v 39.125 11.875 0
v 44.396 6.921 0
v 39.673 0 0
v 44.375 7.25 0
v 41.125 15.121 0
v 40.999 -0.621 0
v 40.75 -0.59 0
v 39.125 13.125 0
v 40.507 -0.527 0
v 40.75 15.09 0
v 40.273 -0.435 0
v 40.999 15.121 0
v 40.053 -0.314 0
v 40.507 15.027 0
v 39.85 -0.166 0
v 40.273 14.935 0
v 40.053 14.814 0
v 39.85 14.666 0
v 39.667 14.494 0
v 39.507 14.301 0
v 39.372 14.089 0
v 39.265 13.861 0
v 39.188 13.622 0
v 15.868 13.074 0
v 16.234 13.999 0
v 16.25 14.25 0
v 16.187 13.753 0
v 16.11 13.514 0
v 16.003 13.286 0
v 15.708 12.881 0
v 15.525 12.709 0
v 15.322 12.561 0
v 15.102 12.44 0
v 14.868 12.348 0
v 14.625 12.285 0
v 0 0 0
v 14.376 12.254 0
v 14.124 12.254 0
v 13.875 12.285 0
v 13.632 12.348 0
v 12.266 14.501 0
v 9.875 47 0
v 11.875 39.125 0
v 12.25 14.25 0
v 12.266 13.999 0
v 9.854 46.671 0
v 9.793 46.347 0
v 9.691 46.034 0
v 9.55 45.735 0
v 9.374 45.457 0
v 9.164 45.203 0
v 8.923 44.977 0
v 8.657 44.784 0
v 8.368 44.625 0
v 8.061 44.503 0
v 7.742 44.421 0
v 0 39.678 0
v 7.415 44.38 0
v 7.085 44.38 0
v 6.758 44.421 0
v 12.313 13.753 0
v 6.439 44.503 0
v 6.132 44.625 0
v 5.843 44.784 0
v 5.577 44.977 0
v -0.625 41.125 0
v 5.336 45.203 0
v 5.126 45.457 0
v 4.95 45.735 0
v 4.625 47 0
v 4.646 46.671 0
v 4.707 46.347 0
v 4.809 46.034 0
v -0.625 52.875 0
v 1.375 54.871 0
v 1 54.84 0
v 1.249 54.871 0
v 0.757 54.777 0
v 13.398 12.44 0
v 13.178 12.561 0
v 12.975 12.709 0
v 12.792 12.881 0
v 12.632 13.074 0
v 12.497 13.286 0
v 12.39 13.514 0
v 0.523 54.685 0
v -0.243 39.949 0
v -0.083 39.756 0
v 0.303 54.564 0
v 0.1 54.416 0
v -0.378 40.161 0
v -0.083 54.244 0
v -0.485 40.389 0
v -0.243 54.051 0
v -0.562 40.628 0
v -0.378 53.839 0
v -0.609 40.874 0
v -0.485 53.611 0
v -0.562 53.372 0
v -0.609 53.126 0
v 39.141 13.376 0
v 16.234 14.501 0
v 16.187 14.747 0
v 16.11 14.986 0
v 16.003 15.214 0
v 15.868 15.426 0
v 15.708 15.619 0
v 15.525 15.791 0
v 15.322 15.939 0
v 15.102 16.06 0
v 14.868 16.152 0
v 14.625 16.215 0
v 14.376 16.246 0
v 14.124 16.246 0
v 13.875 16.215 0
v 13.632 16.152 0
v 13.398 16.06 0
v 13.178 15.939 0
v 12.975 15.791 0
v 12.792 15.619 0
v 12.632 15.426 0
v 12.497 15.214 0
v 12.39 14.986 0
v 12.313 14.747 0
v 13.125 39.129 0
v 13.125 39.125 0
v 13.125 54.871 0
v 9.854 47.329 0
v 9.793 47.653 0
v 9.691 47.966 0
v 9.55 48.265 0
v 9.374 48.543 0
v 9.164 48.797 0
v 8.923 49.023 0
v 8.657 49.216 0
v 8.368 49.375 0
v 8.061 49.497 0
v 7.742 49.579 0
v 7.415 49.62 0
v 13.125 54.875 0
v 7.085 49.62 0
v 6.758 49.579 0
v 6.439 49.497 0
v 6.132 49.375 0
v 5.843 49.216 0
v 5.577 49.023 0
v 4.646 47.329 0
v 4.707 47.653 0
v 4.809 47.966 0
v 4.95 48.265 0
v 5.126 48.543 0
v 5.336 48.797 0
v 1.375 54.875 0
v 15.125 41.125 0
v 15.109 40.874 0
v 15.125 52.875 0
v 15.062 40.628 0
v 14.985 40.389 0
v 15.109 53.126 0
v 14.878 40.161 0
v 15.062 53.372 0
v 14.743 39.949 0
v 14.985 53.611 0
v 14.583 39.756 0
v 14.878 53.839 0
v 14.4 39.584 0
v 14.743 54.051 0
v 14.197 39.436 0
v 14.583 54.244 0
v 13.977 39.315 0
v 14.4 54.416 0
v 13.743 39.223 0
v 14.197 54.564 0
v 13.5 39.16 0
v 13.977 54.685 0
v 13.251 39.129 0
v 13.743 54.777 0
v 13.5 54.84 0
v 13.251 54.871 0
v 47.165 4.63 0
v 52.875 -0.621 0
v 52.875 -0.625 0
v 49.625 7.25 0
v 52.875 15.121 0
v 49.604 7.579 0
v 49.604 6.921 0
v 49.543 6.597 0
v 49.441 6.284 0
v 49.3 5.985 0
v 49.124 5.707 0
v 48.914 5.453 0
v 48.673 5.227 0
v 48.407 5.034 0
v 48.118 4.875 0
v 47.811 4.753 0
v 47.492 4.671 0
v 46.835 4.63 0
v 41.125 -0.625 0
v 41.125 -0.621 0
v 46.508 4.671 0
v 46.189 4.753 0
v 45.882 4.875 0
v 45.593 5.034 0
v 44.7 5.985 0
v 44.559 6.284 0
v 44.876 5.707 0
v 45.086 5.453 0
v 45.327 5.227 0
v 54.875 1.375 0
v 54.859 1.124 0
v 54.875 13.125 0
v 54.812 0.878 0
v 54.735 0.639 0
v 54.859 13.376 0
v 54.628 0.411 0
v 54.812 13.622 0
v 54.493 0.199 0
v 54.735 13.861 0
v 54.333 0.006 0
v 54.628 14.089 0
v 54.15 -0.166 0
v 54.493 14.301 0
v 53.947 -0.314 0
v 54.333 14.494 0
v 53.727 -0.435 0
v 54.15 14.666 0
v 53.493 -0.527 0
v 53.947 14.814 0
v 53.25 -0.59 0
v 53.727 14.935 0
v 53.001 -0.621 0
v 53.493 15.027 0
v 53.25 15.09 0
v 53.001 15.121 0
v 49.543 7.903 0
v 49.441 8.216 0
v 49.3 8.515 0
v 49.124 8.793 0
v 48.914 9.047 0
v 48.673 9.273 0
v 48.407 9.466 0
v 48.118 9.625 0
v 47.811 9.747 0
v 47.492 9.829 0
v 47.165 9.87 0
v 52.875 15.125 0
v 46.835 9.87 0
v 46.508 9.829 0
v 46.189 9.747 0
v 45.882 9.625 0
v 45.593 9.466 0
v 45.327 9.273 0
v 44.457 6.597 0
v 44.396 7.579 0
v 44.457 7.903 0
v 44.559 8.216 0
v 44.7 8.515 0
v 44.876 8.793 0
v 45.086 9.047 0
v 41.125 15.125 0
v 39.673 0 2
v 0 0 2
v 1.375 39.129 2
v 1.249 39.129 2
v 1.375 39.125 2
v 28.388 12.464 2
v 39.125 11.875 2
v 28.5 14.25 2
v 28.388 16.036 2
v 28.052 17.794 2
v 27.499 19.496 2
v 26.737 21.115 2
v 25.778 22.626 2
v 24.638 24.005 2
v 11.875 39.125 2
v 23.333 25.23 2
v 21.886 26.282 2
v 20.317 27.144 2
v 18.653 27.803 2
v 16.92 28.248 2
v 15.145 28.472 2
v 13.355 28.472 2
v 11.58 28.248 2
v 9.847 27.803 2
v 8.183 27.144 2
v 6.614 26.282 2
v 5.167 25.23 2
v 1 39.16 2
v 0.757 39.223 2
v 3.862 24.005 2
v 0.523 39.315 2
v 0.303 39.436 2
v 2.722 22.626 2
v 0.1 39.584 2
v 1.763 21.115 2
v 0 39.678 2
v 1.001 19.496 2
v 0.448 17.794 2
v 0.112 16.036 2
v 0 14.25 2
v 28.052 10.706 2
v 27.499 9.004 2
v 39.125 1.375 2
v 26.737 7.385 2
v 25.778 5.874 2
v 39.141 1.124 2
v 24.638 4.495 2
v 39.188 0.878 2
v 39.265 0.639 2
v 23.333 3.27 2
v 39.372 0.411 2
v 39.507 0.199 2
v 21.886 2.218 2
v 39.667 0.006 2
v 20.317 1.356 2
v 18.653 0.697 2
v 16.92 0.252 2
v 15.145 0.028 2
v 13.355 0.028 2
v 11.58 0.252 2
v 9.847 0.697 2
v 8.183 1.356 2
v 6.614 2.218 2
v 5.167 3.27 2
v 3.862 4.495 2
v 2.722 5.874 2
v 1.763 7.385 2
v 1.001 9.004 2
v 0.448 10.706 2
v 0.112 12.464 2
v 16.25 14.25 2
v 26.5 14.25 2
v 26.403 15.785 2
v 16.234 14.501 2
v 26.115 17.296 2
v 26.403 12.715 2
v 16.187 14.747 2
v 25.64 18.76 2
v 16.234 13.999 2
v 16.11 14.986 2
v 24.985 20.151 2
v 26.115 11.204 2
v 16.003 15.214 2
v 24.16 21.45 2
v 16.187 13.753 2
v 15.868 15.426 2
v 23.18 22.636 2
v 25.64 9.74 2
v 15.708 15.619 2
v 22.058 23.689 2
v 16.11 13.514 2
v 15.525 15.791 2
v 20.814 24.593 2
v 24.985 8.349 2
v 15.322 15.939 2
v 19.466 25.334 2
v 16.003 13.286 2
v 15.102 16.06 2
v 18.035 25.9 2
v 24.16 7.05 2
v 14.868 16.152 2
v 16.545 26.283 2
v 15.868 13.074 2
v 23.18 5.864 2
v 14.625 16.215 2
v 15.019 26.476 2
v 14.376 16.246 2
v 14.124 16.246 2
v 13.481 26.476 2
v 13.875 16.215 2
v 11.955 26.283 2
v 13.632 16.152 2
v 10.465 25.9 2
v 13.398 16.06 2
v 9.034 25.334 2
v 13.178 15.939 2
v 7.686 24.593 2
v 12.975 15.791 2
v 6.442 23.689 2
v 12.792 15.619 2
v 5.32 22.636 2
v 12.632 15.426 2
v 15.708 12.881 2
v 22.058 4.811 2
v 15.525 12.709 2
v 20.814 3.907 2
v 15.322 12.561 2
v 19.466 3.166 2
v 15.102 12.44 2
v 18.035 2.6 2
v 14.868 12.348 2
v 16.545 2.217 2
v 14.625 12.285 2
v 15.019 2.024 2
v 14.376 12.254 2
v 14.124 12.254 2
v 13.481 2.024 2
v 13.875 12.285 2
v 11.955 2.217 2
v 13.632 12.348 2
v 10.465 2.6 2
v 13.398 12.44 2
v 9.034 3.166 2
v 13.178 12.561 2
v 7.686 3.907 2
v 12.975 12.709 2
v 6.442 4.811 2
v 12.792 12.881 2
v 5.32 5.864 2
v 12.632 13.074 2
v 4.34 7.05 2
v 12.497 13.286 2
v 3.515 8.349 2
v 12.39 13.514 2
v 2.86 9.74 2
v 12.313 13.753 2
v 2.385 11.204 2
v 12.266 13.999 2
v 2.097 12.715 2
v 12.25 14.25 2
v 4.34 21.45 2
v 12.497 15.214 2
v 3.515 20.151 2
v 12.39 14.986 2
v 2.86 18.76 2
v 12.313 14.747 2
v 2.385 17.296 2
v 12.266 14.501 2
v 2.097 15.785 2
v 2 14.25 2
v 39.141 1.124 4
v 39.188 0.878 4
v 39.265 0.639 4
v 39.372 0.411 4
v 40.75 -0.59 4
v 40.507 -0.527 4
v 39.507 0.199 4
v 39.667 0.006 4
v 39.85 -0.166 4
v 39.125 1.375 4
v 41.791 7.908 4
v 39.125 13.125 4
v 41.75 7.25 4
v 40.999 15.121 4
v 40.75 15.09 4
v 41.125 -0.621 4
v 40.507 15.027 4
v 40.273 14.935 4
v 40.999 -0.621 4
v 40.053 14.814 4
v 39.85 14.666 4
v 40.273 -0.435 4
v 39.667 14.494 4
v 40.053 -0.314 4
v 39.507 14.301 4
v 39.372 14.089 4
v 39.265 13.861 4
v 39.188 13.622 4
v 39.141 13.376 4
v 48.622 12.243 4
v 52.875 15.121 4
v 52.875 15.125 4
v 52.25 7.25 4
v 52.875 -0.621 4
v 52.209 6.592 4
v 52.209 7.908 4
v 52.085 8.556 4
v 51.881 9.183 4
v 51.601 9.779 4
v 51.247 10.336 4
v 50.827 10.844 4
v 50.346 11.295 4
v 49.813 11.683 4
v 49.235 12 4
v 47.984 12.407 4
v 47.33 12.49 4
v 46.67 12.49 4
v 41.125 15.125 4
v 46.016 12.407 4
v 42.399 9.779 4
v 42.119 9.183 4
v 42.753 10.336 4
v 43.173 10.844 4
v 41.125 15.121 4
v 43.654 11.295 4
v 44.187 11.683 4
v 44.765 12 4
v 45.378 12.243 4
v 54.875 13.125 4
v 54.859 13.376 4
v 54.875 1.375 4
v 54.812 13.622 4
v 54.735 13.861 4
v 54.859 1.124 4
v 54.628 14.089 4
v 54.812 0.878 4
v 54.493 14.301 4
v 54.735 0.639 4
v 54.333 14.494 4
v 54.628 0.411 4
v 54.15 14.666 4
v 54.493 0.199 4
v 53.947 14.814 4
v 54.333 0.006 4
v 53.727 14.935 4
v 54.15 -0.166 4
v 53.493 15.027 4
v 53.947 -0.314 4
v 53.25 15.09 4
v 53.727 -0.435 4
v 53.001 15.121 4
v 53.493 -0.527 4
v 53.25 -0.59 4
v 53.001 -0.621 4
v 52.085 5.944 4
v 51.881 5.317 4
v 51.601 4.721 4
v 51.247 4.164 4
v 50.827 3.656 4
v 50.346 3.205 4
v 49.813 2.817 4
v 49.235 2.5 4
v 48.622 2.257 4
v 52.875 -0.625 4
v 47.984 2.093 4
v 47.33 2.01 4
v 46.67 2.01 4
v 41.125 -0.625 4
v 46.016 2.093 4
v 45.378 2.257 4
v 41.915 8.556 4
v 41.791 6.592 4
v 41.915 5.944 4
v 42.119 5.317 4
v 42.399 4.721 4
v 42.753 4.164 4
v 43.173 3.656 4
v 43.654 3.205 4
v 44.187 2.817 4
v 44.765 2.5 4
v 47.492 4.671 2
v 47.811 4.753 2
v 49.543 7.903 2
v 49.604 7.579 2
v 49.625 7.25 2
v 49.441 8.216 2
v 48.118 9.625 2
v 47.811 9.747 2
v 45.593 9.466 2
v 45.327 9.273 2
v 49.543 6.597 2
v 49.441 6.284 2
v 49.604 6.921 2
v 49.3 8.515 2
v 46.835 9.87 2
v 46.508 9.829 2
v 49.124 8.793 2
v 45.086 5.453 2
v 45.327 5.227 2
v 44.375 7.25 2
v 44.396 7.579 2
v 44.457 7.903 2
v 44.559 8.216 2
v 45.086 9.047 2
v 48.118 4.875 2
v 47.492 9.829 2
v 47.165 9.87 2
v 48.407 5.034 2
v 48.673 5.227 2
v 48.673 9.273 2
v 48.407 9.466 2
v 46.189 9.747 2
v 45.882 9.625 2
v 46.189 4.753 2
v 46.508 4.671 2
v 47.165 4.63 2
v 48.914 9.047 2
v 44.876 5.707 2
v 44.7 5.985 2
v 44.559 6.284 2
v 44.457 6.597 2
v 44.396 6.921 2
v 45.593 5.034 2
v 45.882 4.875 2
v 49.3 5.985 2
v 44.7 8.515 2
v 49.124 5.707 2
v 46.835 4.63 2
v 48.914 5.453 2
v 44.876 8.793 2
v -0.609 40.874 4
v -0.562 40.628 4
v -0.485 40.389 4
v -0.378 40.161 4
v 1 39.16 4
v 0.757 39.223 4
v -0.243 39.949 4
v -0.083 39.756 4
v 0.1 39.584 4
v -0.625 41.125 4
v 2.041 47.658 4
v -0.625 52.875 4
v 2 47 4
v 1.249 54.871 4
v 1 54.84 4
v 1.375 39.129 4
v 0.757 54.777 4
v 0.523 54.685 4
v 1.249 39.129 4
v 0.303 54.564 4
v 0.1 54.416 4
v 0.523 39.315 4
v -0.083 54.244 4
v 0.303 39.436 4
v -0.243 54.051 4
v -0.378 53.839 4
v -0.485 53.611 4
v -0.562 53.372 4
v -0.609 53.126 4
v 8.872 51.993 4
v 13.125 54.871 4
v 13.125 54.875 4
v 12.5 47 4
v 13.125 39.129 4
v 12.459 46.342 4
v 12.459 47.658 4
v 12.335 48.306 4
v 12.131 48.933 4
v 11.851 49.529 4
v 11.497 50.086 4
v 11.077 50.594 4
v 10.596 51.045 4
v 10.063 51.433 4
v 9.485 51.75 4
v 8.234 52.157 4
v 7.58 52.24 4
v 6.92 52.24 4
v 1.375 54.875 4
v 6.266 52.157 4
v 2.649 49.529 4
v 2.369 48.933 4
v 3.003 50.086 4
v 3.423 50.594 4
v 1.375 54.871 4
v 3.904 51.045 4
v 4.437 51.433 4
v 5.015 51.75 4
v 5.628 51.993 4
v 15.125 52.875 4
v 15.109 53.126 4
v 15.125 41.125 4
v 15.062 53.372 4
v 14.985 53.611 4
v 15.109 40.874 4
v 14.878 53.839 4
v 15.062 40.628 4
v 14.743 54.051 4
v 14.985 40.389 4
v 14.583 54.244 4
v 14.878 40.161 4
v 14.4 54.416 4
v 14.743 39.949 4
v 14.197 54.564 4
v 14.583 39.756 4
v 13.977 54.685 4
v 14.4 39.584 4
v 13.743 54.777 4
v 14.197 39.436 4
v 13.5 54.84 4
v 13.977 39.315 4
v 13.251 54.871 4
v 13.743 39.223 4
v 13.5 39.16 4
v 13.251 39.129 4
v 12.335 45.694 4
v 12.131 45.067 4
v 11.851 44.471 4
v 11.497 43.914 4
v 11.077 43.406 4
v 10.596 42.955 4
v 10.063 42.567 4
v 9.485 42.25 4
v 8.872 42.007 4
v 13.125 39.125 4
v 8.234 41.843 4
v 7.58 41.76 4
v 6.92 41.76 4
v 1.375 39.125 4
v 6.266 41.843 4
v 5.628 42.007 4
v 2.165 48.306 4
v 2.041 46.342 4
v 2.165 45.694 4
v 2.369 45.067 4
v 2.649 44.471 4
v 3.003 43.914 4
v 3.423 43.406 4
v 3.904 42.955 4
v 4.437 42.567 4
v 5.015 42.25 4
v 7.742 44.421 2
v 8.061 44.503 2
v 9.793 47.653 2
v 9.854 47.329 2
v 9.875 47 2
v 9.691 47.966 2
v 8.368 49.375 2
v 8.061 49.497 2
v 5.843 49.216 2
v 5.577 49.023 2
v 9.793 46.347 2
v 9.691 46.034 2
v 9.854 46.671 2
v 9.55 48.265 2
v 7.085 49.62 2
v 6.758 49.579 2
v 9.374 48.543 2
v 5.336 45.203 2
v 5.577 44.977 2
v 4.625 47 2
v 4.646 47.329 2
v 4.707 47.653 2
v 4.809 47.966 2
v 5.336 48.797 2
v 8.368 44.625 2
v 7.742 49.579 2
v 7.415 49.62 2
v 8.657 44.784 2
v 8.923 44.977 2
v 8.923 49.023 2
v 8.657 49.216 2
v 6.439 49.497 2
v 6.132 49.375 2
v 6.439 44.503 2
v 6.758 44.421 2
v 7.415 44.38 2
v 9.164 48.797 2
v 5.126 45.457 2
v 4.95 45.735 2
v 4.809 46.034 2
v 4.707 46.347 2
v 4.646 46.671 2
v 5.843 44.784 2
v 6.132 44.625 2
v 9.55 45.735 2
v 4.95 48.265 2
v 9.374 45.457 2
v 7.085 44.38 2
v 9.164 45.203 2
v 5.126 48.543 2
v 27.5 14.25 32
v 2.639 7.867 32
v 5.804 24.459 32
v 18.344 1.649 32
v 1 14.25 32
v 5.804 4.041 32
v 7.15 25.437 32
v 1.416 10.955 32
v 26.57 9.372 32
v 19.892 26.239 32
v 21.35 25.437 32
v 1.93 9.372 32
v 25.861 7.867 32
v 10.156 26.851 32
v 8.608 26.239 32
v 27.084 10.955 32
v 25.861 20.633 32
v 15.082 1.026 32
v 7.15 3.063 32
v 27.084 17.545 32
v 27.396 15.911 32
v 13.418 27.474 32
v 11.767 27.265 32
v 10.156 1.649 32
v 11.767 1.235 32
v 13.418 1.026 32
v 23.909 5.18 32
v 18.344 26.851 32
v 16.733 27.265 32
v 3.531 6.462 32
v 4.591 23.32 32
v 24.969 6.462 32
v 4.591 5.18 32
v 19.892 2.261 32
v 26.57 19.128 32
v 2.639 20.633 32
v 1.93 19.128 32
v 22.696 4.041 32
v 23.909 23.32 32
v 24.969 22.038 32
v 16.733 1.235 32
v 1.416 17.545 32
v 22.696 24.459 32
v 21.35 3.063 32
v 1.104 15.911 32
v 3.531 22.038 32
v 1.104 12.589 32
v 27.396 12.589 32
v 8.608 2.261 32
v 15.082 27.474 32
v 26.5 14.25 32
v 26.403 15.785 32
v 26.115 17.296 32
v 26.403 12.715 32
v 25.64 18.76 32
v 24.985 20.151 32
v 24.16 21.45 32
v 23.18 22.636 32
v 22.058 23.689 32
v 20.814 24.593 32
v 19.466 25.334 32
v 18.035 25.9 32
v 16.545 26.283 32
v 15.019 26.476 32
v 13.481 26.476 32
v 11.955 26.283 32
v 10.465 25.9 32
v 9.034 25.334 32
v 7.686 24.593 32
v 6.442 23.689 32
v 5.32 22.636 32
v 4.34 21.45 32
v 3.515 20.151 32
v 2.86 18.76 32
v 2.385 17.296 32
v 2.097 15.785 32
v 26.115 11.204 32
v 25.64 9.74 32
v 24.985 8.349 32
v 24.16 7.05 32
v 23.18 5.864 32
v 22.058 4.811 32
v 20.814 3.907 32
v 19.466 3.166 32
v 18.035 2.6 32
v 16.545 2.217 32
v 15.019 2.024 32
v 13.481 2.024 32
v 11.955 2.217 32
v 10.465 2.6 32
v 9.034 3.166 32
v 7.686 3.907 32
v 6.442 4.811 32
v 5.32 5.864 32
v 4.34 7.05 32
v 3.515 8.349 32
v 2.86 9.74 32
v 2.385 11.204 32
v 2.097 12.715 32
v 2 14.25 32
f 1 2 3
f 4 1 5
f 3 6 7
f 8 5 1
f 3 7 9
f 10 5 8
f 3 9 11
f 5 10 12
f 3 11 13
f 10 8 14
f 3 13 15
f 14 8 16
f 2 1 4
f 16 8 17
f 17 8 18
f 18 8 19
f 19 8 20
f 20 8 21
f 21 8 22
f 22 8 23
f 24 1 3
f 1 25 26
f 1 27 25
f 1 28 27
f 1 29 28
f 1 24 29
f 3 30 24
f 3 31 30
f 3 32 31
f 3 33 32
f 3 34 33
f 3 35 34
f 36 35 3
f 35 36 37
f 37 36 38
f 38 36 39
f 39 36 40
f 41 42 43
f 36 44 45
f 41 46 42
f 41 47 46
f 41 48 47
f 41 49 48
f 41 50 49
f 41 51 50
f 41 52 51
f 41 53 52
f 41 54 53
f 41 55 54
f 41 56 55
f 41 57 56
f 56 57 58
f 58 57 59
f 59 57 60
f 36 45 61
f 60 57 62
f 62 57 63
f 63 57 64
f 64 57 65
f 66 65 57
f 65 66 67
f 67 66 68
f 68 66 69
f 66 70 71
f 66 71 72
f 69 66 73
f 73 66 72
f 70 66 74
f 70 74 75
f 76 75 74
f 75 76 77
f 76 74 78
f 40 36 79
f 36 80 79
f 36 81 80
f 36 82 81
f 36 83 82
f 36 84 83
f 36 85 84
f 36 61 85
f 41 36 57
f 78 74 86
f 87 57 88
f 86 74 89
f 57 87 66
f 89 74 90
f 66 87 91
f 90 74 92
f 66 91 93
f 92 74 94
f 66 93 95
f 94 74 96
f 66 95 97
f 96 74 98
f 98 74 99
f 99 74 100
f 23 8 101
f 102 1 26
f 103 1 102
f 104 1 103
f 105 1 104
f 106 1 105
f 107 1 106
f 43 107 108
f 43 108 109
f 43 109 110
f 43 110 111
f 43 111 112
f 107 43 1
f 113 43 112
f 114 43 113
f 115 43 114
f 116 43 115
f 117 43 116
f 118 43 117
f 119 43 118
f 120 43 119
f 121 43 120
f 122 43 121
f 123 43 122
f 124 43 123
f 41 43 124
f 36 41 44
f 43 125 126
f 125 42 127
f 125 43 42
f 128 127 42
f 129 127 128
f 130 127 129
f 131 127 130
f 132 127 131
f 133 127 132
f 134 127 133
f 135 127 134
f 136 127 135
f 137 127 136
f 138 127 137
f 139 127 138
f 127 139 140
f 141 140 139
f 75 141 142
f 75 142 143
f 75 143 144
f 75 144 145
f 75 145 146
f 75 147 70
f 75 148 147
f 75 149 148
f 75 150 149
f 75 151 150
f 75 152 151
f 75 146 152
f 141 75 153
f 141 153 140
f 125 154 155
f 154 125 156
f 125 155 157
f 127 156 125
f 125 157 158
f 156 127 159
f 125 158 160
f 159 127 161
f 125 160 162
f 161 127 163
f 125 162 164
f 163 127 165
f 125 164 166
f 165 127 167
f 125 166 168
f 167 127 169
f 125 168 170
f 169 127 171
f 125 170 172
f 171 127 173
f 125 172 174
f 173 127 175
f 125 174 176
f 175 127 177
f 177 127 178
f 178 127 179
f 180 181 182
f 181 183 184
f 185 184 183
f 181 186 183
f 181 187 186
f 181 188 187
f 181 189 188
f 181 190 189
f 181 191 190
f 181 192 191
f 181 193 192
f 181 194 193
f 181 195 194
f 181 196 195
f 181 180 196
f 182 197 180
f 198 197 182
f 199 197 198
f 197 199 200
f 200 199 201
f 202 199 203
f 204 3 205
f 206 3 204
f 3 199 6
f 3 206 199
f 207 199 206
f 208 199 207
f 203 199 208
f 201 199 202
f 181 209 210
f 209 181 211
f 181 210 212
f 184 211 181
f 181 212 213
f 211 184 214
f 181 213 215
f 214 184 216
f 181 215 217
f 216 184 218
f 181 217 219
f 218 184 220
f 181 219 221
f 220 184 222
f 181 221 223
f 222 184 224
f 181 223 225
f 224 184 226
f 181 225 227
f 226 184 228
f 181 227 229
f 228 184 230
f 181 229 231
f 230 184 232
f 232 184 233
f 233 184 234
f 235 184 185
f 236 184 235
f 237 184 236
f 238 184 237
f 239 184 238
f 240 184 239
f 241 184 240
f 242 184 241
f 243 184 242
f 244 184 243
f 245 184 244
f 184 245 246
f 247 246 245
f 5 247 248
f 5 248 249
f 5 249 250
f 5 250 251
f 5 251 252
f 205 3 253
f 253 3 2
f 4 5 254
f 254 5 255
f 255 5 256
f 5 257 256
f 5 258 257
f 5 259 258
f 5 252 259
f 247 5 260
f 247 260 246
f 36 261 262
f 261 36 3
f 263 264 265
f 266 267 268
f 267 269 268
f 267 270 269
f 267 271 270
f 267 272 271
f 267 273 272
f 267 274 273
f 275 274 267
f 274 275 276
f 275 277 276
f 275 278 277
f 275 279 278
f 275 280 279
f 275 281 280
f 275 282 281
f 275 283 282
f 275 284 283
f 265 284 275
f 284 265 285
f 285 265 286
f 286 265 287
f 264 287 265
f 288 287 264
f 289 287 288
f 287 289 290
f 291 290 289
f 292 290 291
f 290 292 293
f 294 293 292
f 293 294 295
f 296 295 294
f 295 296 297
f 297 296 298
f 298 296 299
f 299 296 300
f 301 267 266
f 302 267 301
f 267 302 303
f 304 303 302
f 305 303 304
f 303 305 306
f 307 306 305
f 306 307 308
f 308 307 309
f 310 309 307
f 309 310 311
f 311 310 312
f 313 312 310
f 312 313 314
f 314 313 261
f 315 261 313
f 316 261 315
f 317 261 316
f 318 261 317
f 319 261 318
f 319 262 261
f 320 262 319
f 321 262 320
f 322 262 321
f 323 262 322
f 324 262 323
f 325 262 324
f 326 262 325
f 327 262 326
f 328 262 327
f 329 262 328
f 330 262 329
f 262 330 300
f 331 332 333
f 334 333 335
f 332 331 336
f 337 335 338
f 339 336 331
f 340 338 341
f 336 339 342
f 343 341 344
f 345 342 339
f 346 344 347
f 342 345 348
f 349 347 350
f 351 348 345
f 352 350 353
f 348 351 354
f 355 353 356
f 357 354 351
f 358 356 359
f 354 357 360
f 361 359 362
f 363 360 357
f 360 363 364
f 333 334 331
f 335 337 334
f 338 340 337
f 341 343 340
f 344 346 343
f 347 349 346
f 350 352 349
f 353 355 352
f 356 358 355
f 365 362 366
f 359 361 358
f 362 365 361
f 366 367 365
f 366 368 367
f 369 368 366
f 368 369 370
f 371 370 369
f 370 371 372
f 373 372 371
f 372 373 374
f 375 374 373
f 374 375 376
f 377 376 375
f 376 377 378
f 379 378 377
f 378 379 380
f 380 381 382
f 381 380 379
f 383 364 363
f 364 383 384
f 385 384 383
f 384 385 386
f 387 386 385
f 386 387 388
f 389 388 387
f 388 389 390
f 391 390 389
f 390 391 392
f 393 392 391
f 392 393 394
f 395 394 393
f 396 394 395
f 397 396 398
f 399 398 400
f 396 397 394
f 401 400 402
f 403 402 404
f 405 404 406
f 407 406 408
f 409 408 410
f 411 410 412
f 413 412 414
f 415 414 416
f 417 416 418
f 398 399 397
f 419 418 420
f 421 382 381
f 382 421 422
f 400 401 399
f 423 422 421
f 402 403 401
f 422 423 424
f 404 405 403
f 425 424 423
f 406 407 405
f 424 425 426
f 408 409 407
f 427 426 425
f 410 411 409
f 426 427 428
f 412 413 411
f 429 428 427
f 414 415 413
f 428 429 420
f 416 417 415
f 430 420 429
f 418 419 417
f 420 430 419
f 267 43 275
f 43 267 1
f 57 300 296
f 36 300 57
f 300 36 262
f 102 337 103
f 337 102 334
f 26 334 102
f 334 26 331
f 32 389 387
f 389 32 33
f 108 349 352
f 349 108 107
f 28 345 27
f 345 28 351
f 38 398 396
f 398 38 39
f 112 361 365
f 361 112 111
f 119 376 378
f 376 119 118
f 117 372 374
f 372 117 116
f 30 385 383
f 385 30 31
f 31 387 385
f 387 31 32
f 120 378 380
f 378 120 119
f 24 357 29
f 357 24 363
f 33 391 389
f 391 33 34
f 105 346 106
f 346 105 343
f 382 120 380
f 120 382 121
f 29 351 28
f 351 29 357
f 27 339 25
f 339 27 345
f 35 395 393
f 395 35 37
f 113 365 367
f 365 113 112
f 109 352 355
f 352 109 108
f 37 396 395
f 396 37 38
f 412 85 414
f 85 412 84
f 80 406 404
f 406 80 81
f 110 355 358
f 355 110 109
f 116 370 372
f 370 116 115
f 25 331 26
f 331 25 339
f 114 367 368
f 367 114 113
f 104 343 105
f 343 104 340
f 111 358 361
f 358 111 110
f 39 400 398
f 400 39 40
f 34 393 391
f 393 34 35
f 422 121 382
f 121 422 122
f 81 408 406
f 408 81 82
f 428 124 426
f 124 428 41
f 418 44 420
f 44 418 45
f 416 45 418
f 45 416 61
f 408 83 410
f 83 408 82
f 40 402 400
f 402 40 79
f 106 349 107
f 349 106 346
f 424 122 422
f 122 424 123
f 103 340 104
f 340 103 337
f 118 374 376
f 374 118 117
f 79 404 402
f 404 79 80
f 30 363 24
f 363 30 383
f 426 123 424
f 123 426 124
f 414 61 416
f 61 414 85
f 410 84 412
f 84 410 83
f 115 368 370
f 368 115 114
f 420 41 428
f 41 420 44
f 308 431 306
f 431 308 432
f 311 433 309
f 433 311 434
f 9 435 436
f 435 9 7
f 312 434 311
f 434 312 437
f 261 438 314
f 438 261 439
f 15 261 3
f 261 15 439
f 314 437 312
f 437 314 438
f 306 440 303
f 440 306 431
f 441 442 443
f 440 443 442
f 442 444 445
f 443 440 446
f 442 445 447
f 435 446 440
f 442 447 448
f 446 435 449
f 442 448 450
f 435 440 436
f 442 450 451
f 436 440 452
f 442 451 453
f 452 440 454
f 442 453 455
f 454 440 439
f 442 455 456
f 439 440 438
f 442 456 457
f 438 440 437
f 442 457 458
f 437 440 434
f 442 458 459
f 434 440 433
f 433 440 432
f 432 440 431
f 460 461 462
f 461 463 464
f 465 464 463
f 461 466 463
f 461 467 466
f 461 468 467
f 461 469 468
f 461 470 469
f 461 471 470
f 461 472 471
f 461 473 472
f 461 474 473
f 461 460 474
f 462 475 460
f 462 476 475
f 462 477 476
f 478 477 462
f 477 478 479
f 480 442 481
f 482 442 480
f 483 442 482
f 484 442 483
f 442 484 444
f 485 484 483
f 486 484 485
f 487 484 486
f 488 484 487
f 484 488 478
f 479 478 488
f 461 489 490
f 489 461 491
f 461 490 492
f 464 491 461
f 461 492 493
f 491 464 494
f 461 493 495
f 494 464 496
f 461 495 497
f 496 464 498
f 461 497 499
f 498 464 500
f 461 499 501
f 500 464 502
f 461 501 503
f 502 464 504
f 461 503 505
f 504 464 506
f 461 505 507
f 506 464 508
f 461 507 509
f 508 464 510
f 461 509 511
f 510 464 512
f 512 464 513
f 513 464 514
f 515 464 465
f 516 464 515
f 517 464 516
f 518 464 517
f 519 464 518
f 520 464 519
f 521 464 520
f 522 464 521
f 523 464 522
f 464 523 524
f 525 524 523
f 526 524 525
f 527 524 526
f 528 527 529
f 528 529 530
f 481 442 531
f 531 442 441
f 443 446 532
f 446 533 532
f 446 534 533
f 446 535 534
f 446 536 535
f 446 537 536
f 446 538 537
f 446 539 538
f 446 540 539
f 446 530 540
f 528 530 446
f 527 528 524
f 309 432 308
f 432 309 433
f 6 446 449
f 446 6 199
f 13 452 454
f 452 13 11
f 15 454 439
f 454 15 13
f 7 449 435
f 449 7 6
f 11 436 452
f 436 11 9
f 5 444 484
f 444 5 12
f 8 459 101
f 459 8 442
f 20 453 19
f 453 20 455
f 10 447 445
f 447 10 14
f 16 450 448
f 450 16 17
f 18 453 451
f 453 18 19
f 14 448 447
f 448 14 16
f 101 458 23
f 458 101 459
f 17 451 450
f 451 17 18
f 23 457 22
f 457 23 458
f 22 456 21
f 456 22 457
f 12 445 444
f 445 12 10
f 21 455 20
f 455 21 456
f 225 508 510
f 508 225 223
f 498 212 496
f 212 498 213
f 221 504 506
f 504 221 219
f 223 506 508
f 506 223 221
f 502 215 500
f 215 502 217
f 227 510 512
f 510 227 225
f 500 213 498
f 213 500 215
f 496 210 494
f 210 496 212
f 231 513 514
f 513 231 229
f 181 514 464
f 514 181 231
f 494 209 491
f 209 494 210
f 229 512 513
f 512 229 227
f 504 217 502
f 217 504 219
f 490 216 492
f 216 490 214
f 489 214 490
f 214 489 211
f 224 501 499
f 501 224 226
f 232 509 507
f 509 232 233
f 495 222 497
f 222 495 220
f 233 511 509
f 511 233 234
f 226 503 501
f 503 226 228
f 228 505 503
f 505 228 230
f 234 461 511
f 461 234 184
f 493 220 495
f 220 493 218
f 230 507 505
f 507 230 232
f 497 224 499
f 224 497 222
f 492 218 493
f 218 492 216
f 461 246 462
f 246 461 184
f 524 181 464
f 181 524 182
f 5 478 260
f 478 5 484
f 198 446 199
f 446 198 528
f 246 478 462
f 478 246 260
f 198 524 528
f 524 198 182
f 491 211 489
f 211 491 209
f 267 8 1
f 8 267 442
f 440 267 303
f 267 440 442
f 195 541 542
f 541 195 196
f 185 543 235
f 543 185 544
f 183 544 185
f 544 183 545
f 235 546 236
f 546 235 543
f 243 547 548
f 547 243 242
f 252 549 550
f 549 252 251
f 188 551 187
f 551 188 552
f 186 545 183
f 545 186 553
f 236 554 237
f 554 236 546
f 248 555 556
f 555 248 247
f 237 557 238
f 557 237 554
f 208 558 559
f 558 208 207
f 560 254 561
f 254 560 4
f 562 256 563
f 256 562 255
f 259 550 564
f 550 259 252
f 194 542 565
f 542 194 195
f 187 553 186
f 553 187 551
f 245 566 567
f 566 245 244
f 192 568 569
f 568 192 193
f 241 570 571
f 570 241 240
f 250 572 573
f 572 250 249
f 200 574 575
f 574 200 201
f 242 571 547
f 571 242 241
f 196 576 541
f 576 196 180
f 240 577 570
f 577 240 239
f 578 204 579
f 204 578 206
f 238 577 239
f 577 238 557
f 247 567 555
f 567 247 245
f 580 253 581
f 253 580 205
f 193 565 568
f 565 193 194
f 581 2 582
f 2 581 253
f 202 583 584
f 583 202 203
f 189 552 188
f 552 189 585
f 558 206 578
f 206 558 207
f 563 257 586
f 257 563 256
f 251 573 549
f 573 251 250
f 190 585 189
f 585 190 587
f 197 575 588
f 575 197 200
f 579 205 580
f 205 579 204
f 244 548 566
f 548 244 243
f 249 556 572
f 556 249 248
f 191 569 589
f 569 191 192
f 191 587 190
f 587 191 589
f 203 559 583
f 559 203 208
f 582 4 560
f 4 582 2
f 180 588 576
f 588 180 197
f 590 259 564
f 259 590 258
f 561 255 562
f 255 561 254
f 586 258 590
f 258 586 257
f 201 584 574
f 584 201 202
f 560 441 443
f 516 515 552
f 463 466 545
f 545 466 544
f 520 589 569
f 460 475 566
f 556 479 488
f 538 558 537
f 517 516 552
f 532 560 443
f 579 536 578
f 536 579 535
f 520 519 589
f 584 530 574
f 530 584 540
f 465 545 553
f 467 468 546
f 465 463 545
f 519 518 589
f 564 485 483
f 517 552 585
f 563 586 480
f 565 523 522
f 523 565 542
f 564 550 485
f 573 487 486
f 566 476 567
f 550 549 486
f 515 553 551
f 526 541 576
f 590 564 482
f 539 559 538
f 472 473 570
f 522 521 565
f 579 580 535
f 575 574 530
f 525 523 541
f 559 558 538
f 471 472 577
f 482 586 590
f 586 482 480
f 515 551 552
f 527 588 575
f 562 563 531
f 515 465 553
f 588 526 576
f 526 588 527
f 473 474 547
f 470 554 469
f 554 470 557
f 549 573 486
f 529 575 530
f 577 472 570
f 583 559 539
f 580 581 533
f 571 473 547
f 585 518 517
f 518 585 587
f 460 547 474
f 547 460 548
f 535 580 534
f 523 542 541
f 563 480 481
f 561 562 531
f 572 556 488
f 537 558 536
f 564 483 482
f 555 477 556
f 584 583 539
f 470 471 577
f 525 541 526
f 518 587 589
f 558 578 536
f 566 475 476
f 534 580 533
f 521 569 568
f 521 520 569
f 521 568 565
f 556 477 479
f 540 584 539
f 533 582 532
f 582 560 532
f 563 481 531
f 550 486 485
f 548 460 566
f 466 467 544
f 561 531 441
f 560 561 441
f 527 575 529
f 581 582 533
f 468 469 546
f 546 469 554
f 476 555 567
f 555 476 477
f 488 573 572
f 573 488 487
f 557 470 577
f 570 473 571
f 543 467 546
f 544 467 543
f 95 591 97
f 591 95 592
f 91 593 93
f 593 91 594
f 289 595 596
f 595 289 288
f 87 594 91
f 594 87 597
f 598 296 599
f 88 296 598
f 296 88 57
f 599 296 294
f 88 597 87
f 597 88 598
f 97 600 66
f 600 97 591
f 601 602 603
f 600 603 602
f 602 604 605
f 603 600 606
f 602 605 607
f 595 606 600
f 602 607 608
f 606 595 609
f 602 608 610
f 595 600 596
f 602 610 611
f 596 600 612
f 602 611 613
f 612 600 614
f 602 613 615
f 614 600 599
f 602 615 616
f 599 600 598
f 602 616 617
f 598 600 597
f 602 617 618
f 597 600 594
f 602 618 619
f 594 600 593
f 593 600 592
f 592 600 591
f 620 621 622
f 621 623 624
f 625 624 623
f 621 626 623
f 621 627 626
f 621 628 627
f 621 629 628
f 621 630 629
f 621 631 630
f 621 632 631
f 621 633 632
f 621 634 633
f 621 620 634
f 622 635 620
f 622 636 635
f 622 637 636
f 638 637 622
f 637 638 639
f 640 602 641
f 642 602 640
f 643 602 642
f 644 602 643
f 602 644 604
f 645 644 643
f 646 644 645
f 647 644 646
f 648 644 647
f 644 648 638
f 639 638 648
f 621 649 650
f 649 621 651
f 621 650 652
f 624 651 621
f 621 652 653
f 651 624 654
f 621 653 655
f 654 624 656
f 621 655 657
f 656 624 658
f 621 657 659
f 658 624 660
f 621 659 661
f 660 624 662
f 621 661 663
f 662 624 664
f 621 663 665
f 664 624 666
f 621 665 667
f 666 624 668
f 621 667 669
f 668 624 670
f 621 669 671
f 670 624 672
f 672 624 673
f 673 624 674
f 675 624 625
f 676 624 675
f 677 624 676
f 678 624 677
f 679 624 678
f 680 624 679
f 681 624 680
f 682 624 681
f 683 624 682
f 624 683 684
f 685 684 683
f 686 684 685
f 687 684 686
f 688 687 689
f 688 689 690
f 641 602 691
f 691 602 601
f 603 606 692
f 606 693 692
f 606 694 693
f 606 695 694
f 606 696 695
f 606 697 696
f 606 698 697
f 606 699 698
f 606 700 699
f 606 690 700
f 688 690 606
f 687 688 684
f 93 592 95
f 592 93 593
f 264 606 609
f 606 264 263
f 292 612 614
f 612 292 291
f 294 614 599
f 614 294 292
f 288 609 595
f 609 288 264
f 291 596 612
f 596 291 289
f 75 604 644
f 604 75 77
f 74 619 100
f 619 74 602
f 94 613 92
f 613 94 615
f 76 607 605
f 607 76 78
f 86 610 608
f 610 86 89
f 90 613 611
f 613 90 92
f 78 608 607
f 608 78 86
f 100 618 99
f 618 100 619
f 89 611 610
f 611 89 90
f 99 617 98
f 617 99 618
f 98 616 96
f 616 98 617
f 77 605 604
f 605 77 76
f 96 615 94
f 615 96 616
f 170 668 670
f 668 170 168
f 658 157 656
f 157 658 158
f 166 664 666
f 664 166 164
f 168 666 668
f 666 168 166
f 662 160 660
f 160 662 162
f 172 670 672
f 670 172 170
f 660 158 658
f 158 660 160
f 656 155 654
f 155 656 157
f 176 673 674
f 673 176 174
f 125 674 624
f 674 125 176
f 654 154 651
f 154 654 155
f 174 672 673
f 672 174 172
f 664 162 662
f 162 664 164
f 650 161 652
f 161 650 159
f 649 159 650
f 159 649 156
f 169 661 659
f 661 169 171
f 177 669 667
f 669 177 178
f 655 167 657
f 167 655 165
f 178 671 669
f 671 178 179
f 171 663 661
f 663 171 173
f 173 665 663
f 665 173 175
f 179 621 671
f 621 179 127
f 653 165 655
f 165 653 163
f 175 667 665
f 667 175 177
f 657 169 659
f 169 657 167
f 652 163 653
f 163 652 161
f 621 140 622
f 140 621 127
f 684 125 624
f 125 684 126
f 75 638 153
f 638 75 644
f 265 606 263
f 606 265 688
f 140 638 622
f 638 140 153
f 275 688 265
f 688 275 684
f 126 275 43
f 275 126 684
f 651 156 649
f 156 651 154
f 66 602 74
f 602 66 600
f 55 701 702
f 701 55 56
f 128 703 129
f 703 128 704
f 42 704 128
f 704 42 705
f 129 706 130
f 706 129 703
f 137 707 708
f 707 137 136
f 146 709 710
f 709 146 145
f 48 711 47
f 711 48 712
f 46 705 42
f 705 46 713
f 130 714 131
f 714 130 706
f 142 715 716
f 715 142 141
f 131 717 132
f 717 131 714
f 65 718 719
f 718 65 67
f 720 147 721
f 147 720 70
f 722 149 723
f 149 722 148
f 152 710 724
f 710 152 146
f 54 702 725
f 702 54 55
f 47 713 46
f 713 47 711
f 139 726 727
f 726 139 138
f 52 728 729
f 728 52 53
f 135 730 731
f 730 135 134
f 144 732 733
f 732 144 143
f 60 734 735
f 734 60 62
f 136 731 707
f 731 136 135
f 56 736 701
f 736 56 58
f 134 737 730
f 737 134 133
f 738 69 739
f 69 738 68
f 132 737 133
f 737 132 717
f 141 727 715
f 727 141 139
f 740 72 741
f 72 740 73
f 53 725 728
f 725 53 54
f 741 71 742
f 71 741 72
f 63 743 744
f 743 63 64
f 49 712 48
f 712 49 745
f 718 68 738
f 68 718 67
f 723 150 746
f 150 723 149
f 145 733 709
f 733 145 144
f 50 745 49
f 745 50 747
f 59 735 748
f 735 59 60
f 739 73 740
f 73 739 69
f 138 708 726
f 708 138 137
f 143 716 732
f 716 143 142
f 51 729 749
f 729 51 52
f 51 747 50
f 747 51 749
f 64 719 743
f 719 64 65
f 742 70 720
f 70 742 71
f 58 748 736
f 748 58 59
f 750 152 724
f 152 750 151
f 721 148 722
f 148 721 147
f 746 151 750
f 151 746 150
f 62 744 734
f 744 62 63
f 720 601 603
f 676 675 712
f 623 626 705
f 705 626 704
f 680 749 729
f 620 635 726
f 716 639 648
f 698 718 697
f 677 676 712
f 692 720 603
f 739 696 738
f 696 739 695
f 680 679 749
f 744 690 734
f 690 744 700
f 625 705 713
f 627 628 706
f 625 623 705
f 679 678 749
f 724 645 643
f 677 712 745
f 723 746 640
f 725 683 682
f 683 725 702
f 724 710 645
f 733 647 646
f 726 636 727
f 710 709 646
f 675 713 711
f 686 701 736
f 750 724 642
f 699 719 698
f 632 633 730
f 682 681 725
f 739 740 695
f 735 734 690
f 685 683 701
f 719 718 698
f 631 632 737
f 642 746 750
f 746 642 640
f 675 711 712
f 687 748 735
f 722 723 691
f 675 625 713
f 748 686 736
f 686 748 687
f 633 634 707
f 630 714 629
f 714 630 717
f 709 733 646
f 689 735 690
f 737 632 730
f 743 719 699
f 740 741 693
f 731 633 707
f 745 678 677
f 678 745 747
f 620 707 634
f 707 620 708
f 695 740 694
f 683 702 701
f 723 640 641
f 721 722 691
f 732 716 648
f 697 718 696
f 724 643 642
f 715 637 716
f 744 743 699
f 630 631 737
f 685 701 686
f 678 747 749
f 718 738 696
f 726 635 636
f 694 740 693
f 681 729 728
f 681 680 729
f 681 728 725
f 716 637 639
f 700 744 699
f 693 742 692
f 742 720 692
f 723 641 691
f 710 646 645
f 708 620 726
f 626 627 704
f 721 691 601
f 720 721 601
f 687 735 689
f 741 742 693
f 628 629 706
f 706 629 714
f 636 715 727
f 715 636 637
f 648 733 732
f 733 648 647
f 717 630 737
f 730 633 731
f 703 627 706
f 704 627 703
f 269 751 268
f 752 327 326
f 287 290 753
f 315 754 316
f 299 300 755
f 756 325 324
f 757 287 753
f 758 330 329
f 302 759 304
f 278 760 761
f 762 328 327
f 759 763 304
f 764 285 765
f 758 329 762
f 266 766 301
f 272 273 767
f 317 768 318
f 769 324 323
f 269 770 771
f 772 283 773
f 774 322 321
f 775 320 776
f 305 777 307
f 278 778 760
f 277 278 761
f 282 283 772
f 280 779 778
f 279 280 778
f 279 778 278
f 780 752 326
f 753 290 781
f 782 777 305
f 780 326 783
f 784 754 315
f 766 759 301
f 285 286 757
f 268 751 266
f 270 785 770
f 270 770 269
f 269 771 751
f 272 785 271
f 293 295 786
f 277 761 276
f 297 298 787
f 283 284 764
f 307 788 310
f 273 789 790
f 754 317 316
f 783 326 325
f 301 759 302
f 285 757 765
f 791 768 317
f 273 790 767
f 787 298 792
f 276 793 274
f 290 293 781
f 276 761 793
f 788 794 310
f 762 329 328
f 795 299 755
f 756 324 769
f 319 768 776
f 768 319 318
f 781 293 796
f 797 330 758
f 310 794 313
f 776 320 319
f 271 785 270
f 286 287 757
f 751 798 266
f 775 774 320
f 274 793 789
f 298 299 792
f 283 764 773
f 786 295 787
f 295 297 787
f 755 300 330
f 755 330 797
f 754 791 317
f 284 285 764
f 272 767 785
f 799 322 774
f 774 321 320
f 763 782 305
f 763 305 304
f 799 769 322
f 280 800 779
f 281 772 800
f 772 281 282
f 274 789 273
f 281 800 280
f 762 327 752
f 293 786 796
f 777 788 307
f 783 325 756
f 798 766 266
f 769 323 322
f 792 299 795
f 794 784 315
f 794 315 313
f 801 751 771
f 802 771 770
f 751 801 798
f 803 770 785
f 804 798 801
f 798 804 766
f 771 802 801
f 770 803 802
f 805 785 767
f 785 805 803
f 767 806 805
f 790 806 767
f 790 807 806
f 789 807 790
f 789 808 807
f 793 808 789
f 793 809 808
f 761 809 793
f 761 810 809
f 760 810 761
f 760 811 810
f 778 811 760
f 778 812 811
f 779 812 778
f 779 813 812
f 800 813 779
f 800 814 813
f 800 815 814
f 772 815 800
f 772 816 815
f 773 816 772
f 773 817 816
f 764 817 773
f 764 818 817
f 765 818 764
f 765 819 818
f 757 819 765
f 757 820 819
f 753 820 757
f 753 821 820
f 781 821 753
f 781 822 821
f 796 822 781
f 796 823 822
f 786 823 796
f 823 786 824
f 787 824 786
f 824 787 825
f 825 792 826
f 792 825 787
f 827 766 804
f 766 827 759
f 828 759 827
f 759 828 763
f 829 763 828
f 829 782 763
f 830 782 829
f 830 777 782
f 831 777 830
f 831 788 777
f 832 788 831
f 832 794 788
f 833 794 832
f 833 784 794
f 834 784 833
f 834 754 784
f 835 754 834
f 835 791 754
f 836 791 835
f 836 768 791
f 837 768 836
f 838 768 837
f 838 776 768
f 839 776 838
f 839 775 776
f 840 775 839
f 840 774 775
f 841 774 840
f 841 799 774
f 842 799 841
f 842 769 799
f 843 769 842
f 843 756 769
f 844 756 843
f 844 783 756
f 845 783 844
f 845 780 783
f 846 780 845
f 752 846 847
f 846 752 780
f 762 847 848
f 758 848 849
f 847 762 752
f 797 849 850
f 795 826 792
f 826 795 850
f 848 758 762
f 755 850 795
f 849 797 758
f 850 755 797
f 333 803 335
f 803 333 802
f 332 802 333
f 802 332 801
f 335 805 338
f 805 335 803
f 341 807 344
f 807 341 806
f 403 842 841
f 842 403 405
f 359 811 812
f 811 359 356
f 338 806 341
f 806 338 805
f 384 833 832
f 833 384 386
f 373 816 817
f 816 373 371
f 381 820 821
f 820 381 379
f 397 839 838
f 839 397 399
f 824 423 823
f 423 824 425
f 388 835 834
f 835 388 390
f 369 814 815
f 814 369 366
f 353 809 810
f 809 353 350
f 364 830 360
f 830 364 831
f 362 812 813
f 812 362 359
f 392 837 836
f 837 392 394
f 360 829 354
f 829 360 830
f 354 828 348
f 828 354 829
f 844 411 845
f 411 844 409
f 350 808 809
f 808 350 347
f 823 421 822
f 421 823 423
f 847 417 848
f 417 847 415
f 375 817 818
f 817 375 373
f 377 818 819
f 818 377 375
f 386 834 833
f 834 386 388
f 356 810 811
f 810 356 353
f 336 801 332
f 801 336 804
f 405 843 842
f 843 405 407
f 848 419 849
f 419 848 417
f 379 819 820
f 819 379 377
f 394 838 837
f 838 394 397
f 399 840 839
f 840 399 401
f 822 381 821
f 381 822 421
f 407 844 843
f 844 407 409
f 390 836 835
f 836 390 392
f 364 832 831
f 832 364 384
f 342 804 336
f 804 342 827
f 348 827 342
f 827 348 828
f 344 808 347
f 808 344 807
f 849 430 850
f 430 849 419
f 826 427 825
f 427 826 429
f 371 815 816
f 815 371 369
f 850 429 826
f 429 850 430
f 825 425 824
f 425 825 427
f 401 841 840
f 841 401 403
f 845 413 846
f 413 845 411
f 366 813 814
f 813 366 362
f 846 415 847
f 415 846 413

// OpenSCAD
use <MCAD/boxes.scad>
use <MCAD/triangles.scad>

diam = 24.5;
thick = 2;
height = 30;
screwDiam = 3.5;
$fn= 50;

union() {
	difference() {
		triangle(diam*2+thick, diam*2+thick, thick);
		translate([0.5*diam+thick,0.5*diam+thick,-thick]) cylinder(d=4, h=3*thick);
		translate([diam*2-thick, screwDiam*1.5+thick, -thick])  cylinder(d=screwDiam *1.5, h=3*thick);
		translate([screwDiam*1.5+thick, diam*2-thick, -thick])  cylinder(d=screwDiam *1.5, h=3*thick);
	};
	translate([diam*2-thick, screwDiam *1.5+thick, thick]) blocVis(screwDiam *1.5, 2*thick);
	translate([screwDiam *1.5+thick, diam*2-thick, thick]) blocVis(screwDiam *1.5, 2*thick);
	
	translate([0.5*diam+thick,0.5*diam+thick,thick]) 
		difference() {
			cylinder(d1=diam+2*thick, d2=diam+thick, h=height);
			cylinder(d=diam,h=height);
		}
}

module blocVis(diamVis, blocHeight) {
	difference() {
		roundedBox([3*diamVis,3*diamVis,blocHeight], 0.5*blocHeight, true);
		translate([0,0,-1.5*blocHeight]) cylinder(d=diamVis, h=3*blocHeight);
		cylinder(d=diamVis, d2=2*diamVis, h=0.5*blocHeight);
			
	}

}
